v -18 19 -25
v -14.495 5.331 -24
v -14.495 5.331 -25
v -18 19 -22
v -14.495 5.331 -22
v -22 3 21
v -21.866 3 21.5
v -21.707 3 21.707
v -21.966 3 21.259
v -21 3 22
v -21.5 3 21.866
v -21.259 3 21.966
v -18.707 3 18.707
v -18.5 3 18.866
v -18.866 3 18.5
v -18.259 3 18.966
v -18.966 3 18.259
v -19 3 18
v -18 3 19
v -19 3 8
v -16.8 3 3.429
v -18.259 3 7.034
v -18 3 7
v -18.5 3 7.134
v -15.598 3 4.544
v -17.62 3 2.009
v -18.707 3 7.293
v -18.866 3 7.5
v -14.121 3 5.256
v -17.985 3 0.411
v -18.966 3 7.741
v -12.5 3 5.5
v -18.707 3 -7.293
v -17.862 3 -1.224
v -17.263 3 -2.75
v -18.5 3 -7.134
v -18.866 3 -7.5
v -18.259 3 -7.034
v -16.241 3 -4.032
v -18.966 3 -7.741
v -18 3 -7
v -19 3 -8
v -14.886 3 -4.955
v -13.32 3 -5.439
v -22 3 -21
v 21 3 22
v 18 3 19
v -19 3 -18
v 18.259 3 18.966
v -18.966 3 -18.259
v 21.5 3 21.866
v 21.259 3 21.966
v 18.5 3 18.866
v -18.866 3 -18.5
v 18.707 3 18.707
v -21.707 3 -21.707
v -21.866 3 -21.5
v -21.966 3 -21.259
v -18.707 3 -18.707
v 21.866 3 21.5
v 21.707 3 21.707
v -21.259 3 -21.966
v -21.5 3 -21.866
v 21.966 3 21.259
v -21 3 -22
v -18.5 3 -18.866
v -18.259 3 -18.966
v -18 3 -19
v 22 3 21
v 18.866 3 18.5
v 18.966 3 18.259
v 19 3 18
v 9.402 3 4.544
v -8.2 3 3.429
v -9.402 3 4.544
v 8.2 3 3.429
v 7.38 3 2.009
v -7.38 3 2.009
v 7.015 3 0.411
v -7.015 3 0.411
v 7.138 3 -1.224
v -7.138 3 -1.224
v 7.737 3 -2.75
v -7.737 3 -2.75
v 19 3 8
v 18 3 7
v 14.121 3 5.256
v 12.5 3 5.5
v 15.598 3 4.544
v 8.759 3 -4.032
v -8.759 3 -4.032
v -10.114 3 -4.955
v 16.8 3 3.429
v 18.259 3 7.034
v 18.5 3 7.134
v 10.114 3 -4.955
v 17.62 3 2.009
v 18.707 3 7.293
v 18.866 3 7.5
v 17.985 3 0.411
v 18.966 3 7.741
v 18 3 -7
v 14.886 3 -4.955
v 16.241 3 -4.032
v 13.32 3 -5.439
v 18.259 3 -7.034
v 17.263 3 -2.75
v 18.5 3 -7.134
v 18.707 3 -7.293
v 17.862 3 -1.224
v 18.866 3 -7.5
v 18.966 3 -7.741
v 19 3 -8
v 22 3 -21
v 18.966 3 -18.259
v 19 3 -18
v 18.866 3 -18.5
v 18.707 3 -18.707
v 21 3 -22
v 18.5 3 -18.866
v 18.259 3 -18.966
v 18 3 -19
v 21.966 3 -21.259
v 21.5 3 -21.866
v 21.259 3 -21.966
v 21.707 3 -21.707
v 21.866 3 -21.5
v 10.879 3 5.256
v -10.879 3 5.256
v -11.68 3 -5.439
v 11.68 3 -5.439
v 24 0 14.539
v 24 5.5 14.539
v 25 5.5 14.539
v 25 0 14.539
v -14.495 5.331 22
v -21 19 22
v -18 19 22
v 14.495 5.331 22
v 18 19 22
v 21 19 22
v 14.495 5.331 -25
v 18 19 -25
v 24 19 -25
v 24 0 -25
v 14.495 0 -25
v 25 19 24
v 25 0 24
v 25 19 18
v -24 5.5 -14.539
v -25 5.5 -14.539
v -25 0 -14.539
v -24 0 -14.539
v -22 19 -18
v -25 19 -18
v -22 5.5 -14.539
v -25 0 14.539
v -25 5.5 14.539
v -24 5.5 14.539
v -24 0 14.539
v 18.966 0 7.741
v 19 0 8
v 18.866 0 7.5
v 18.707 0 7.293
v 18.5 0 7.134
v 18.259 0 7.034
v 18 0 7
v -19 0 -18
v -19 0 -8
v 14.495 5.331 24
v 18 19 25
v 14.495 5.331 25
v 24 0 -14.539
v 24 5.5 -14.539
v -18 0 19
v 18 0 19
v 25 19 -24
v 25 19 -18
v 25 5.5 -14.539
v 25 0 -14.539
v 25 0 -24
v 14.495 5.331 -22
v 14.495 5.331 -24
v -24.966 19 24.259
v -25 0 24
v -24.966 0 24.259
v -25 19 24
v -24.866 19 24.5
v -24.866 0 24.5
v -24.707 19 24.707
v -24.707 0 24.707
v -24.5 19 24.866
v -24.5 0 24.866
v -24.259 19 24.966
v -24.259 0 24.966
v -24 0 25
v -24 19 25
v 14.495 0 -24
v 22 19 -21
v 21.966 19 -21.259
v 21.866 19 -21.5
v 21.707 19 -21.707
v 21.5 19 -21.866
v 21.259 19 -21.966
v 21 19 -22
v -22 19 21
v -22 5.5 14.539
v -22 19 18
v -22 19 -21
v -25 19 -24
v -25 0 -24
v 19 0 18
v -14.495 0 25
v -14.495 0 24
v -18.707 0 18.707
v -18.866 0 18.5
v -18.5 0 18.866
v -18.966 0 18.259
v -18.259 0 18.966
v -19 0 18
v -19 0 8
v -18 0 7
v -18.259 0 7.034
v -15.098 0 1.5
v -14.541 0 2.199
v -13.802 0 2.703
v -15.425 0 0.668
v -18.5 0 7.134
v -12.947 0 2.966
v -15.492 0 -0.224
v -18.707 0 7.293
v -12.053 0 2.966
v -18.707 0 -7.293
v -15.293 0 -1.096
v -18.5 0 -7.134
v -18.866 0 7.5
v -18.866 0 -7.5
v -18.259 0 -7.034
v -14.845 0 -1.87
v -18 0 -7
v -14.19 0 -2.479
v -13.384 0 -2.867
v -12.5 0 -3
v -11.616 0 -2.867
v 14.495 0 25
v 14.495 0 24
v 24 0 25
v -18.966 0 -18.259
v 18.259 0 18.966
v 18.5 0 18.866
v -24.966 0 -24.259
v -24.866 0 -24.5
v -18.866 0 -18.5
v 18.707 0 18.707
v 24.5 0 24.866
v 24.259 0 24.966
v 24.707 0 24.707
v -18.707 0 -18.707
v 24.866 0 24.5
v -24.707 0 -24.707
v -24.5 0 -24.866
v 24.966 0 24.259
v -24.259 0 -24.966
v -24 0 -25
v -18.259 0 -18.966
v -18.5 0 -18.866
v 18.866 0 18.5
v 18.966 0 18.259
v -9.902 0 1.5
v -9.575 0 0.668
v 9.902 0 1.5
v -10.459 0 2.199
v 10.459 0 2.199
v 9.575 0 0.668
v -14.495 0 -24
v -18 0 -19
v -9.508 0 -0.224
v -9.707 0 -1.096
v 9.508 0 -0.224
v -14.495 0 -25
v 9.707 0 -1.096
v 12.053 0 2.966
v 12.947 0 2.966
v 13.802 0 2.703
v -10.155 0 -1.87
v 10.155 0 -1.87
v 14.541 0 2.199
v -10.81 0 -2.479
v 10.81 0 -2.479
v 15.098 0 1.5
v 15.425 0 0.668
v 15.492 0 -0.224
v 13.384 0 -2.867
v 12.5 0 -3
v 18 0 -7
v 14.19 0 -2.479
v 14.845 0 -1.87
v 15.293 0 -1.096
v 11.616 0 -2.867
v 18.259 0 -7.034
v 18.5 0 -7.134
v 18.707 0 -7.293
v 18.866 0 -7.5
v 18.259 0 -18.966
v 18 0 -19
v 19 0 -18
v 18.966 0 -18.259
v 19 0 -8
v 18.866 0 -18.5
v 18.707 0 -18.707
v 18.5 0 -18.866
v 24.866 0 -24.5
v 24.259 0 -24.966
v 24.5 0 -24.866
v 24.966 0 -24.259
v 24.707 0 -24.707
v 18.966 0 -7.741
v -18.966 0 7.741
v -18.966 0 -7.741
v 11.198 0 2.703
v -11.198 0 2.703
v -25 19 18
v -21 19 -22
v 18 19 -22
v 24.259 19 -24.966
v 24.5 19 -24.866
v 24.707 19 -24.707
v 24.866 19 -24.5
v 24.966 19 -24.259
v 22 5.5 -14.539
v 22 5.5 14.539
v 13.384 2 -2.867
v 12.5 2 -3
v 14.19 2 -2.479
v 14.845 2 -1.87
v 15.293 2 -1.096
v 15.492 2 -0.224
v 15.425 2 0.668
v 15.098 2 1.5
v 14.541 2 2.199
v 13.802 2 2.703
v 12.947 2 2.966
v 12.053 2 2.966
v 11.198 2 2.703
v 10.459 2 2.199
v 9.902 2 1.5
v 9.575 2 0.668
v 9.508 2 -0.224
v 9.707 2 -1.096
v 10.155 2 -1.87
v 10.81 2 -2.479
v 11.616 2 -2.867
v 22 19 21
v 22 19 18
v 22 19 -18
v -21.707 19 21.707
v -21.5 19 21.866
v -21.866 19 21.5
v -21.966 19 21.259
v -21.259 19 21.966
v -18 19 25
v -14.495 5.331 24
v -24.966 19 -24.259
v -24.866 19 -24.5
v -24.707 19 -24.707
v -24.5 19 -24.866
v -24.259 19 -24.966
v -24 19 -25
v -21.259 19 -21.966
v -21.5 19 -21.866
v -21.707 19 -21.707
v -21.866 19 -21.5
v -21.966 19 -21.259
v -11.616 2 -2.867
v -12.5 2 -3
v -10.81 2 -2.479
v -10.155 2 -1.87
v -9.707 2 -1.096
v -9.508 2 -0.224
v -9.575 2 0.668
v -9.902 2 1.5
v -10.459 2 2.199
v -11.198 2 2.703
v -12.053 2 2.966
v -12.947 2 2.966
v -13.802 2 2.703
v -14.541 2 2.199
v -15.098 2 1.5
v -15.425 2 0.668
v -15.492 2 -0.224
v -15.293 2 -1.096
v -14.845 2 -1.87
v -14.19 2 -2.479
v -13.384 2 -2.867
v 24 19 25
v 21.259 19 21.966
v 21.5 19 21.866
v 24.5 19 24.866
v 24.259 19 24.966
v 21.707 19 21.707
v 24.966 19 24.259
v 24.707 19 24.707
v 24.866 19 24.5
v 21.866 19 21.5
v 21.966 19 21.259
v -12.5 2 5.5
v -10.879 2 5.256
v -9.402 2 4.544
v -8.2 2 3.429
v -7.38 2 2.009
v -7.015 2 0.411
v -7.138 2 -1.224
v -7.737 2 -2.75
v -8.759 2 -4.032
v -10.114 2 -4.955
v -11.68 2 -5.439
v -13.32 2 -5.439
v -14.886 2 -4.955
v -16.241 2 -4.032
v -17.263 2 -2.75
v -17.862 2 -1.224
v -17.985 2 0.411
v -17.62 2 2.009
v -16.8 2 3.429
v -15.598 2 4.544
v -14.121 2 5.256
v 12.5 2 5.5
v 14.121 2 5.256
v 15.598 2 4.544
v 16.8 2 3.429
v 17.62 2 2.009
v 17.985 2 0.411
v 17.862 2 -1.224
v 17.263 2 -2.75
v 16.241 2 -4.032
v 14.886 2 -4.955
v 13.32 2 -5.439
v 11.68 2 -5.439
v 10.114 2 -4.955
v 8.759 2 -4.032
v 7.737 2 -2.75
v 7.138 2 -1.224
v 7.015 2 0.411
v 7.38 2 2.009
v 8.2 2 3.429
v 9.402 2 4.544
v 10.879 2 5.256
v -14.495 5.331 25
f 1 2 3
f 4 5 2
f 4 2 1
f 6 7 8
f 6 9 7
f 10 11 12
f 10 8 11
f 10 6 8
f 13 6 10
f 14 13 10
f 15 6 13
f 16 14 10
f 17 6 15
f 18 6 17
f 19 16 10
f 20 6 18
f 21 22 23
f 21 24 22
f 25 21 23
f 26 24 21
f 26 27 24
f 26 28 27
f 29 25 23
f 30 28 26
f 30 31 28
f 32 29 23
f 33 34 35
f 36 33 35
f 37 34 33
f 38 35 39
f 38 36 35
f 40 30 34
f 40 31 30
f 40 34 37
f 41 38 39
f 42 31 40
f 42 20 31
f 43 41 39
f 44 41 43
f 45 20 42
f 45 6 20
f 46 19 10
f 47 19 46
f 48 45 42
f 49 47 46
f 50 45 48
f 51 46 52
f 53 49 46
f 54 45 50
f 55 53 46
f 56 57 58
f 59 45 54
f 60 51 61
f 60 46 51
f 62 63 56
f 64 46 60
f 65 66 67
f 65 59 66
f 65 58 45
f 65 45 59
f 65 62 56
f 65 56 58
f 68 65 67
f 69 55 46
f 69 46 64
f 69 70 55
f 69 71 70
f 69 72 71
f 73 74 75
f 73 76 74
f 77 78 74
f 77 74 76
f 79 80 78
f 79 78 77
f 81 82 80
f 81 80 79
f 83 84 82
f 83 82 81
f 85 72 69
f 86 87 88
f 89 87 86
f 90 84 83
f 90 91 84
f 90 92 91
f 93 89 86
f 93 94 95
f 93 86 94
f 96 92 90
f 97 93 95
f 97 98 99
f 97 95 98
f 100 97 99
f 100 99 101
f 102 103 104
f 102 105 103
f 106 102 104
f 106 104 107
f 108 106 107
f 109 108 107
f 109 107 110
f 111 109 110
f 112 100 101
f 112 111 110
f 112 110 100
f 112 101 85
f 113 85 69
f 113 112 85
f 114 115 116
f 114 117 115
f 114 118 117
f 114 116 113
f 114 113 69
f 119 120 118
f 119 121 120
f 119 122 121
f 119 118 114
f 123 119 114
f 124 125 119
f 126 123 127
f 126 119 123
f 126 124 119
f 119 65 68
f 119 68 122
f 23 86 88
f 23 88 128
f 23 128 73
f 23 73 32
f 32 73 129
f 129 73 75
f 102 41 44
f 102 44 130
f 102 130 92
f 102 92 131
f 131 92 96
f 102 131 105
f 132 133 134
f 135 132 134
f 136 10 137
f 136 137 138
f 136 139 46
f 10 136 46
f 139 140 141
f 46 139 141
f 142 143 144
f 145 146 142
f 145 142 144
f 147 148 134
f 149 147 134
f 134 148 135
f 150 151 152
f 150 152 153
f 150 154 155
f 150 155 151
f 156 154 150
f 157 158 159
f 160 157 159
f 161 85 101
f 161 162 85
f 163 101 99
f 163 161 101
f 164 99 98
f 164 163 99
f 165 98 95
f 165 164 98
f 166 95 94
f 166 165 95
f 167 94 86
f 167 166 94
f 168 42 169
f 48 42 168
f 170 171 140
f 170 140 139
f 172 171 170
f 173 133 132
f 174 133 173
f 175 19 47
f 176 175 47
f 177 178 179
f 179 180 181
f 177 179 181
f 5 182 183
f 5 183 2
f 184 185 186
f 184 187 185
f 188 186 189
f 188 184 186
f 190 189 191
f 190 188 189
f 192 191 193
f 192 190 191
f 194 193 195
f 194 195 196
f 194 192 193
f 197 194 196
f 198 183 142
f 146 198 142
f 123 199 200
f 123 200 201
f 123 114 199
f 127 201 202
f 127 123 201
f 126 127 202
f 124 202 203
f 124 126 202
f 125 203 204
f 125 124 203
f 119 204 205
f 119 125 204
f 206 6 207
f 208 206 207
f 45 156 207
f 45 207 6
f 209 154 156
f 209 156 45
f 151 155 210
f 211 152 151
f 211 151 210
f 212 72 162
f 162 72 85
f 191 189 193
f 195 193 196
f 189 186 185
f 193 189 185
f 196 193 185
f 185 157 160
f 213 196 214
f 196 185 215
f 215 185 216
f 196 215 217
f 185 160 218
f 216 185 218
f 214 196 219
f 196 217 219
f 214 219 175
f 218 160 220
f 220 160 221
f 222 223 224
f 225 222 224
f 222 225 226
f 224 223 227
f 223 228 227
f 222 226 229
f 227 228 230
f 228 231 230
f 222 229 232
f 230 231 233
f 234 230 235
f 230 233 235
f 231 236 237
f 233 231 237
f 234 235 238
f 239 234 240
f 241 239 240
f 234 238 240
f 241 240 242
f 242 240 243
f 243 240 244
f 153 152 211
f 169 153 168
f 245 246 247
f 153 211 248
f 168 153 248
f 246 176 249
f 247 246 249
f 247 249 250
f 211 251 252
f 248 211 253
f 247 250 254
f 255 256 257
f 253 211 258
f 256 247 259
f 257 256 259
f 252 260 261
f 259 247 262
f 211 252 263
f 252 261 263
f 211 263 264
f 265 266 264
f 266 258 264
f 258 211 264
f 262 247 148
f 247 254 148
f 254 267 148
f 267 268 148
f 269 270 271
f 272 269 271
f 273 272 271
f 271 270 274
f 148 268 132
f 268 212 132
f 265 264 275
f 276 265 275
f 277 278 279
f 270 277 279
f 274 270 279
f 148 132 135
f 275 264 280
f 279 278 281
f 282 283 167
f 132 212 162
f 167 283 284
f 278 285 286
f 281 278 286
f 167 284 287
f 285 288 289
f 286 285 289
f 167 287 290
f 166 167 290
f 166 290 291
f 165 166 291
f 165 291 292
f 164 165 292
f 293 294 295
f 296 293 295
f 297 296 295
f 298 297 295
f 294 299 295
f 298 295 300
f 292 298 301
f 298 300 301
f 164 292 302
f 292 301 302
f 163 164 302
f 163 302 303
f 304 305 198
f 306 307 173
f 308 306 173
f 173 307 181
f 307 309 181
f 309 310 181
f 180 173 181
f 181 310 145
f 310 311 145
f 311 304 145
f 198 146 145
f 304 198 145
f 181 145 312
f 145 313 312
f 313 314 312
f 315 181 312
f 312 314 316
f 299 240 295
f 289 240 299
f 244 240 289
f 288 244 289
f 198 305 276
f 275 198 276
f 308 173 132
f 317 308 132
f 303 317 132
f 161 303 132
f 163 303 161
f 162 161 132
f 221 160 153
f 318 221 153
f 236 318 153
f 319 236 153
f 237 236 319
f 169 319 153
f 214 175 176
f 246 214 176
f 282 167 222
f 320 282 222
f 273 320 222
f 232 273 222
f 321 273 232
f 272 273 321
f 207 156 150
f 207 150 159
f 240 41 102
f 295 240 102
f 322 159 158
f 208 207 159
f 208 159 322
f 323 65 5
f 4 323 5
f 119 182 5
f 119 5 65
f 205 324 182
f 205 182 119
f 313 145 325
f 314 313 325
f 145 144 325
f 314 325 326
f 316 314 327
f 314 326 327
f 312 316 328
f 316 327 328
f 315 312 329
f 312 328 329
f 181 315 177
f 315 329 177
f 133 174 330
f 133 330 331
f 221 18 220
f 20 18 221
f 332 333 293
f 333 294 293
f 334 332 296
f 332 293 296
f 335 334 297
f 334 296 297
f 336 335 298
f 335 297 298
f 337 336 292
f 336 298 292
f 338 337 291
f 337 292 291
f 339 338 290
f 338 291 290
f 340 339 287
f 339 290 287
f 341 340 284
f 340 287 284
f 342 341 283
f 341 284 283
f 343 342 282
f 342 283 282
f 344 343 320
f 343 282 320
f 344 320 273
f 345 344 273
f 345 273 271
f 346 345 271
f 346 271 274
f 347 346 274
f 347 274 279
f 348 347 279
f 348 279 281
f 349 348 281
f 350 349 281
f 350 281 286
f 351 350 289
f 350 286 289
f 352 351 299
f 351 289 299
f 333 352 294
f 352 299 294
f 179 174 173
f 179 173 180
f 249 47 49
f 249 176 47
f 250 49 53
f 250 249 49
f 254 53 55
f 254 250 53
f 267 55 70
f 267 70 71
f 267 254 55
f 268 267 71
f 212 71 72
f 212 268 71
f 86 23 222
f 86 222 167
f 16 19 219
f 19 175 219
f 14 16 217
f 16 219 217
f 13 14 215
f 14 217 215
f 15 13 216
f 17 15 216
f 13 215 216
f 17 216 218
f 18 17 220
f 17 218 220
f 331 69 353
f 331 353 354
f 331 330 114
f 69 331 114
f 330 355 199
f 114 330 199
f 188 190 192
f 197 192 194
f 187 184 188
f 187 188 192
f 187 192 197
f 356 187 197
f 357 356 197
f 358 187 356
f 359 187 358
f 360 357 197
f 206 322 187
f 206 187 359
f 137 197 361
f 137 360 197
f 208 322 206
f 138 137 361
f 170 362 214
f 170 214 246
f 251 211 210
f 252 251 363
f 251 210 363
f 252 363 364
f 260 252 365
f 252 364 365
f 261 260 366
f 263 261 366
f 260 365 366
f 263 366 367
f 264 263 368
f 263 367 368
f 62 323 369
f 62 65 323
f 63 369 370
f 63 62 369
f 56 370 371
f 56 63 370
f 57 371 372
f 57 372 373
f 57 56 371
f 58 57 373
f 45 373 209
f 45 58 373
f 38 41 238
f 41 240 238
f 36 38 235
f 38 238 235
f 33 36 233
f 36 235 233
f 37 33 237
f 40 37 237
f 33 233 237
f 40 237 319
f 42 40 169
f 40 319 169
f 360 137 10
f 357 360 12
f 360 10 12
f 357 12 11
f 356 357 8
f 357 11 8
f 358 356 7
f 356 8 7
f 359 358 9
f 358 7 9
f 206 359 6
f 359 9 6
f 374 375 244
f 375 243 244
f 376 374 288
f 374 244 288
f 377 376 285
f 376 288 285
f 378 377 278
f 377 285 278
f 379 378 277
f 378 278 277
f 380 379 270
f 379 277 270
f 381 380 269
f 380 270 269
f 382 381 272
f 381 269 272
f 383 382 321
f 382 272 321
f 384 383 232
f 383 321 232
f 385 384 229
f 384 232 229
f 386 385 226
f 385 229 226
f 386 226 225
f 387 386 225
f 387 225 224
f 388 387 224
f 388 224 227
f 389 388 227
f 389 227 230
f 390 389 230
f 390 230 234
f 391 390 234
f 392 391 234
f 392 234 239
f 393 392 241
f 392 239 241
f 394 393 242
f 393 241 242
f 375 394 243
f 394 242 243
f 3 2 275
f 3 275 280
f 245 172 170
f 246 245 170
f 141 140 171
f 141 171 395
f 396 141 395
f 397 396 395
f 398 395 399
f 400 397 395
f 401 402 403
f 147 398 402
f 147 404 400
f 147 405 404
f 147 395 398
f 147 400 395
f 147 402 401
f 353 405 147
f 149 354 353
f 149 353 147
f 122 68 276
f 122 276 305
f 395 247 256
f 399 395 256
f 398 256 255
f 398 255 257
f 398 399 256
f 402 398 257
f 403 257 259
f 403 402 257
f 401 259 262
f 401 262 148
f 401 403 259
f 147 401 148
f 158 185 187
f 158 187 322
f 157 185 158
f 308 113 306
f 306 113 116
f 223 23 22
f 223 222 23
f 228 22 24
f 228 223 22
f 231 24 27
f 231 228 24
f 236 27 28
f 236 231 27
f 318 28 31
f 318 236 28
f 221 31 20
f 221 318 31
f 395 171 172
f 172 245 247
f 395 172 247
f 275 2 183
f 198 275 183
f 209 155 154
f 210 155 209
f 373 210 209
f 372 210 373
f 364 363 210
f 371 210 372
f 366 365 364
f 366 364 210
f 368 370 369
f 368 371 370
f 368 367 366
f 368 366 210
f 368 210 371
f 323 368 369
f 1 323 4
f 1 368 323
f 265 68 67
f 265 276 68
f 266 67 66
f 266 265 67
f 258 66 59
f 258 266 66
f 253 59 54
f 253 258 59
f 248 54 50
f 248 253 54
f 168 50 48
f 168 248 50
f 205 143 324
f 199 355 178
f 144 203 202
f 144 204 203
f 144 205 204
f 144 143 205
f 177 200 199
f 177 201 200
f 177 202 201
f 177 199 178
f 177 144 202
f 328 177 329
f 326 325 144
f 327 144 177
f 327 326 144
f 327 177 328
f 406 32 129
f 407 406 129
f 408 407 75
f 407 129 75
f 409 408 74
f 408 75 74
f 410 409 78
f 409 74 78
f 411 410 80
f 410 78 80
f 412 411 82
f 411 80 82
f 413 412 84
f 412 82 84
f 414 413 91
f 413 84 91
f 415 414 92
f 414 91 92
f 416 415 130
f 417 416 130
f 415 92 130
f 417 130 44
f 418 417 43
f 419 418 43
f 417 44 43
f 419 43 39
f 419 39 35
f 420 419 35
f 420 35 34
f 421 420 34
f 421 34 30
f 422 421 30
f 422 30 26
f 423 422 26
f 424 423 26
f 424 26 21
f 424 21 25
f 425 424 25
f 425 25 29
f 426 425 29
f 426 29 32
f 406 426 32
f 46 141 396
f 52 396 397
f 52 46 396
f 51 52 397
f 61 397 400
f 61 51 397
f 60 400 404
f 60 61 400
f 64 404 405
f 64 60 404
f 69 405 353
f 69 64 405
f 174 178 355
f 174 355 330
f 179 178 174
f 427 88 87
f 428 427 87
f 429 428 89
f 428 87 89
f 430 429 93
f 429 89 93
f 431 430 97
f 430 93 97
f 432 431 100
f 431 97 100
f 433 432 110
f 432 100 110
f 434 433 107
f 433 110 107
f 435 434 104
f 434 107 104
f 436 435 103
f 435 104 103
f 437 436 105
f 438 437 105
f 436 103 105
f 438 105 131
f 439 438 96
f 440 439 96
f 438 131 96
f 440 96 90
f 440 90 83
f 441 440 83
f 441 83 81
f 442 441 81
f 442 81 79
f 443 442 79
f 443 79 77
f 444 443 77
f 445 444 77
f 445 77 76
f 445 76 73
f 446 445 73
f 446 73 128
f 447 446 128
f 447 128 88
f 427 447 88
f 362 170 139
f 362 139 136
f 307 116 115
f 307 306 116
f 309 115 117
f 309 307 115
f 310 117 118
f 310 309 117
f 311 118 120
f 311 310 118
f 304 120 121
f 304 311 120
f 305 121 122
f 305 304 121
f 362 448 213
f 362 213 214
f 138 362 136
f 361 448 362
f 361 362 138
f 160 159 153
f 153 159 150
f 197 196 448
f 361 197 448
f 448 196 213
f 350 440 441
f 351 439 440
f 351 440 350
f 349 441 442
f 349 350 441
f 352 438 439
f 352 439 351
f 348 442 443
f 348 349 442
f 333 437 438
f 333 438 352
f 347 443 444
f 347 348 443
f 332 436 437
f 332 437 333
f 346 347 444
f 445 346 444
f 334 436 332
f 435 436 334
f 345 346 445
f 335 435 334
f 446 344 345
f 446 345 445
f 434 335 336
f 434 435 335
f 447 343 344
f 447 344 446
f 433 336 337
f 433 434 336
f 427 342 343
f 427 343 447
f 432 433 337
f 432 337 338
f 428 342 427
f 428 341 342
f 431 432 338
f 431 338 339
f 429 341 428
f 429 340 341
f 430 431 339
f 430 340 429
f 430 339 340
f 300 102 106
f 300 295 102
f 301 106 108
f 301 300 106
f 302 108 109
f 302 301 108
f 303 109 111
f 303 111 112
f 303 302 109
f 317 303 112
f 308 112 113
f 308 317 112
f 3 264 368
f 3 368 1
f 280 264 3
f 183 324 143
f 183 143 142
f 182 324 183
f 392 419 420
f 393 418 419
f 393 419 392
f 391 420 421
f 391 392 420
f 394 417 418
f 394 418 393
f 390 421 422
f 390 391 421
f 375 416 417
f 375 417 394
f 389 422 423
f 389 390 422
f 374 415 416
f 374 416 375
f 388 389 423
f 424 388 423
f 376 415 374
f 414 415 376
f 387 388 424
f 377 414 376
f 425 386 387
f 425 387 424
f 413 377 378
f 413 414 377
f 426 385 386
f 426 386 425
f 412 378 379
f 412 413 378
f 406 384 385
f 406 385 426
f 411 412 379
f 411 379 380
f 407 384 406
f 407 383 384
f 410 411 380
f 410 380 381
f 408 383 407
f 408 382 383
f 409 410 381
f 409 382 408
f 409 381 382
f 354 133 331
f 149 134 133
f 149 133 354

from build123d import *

# Parameters (mm, degrees)
SKETCH1_W                      = 50
SKETCH1_H                      = 50
BOSS_EXTRUDE1_DEPTH            = 19
SKETCH2_W                      = 44
SKETCH2_H                      = 44
CUT_EXTRUDE1_DEPTH             = 16
CBORE_FOR_M6_SHCS1_D           = 6
CBORE_FOR_M6_SHCS1_CBORE_D     = 11
CBORE_FOR_M6_SHCS1_CBORE_DEPTH = 1
SKETCH6_W                      = 38
SKETCH6_H                      = 12
CUT_EXTRUDE2_DEPTH             = 16
FILLET1_R                      = 1
FILLET3_R                      = 1
CUT_EXTRUDE3_DEPTH             = 51
CUT_EXTRUDE4_DEPTH             = 51
SKETCH9_W                      = 1
SKETCH9_H                      = 29.077623466
CUT_EXTRUDE5_DEPTH             = 10
SKETCH10_W                     = 28.99096046
SKETCH10_H                     = 1
CUT_EXTRUDE6_DEPTH             = 10
SKETCH11_W                     = 28.99096046
SKETCH11_H                     = 1
CUT_EXTRUDE7_DEPTH             = 10
SKETCH12_W                     = 1
SKETCH12_H                     = 29.077623466
CUT_EXTRUDE8_DEPTH             = 10


with BuildPart() as part:
    # Sketch1 → Boss-Extrude1 (new body)
    with BuildSketch(Plane(origin=(0, 0, 0), x_dir=(1, 0, 0), z_dir=(0, 1, 0))):
        Rectangle(SKETCH1_W, SKETCH1_H)
    extrude(amount=BOSS_EXTRUDE1_DEPTH)

    # Sketch2 → Cut-Extrude1 (cut)
    with BuildSketch(Plane(origin=(0, 19, 0), x_dir=(1, 0, 0), z_dir=(0, 1, 0))):
        Rectangle(SKETCH2_W, SKETCH2_H)
    extrude(amount=-CUT_EXTRUDE1_DEPTH, mode=Mode.SUBTRACT)

    # CBORE for M6 SHCS1 (through all)
    with Locations(Plane(origin=(-12.5, 3, 0), x_dir=(0, 0, 1), z_dir=(0, 1, 0))):
        with Locations((0, 0), (0, 25)):
            CounterBoreHole(CBORE_FOR_M6_SHCS1_D / 2, CBORE_FOR_M6_SHCS1_CBORE_D / 2, CBORE_FOR_M6_SHCS1_CBORE_DEPTH)

    # Sketch6 → Cut-Extrude2 (cut)
    with BuildSketch(Plane(origin=(0, 3, 0), x_dir=(1, 0, 0), z_dir=(0, 1, 0))):
        with Locations((0, -13)):
            Rectangle(SKETCH6_W, SKETCH6_H)
        with Locations((0, 13)):
            Rectangle(SKETCH6_W, SKETCH6_H)
    extrude(amount=-CUT_EXTRUDE2_DEPTH, mode=Mode.SUBTRACT)

    # Fillet1
    fillet1_edges = [part.edges().sort_by_distance(p)[0] for p in [
        (-22, 11, 22),
        (-22, 11, -22),
        (22, 11, -22),
        (22, 11, 22),
        (-19, 1.5, 19),
        (-19, 1.5, 7),
        (19, 1.5, 7),
        (19, 1.5, 19),
        (-19, 1.5, -7),
        (-19, 1.5, -19),
        (19, 1.5, -19),
        (19, 1.5, -7),
    ]]
    fillet(fillet1_edges, radius=FILLET1_R)

    # Fillet3
    fillet3_edges = [part.edges().sort_by_distance(p)[0] for p in [
        (-25, 9.5, -25),
        (25, 9.5, -25),
        (25, 9.5, 25),
        (-25, 9.5, 25),
    ]]
    fillet(fillet3_edges, radius=FILLET3_R)

    # Sketch7 → Cut-Extrude3 (cut, through all)
    with BuildSketch(Plane(origin=(25, 0, 0), x_dir=(0, 0, -1), z_dir=(1, 0, 0))):
        Polygon((14.538811733, 5.5), (-14.538811733, 5.5), (-18, 19), (18, 19), align=None)
    extrude(amount=-CUT_EXTRUDE3_DEPTH, mode=Mode.SUBTRACT)

    # Sketch8 → Cut-Extrude4 (cut, through all)
    with BuildSketch(Plane.XY.offset(25)):
        Polygon((-18, 19), (18, 19), (14.49548023, 5.330990042), (-14.49548023, 5.330990042), align=None)
    extrude(amount=-CUT_EXTRUDE4_DEPTH, mode=Mode.SUBTRACT)

    # Sketch9 → Cut-Extrude5 (cut)
    with BuildSketch(Plane(origin=(0, 5.5, 0), x_dir=(1, 0, 0), z_dir=(0, 1, 0))):
        with Locations((24.5, 0)):
            Rectangle(SKETCH9_W, SKETCH9_H)
    extrude(amount=-CUT_EXTRUDE5_DEPTH, mode=Mode.SUBTRACT)

    # Sketch10 → Cut-Extrude6 (cut)
    with BuildSketch(Plane(origin=(0, 5.330990042, 0), x_dir=(1, 0, 0), z_dir=(0, 1, 0))):
        with Locations((0, -24.5)):
            Rectangle(SKETCH10_W, SKETCH10_H)
    extrude(amount=-CUT_EXTRUDE6_DEPTH, mode=Mode.SUBTRACT)

    # Sketch11 → Cut-Extrude7 (cut)
    with BuildSketch(Plane(origin=(0, 5.330990042, 0), x_dir=(1, 0, 0), z_dir=(0, 1, 0))):
        with Locations((0, 24.5)):
            Rectangle(SKETCH11_W, SKETCH11_H)
    extrude(amount=-CUT_EXTRUDE7_DEPTH, mode=Mode.SUBTRACT)

    # Sketch12 → Cut-Extrude8 (cut)
    with BuildSketch(Plane(origin=(0, 5.5, 0), x_dir=(1, 0, 0), z_dir=(0, 1, 0))):
        with Locations((-24.5, 0)):
            Rectangle(SKETCH12_W, SKETCH12_H)
    extrude(amount=-CUT_EXTRUDE8_DEPTH, mode=Mode.SUBTRACT)


solid = part.part
